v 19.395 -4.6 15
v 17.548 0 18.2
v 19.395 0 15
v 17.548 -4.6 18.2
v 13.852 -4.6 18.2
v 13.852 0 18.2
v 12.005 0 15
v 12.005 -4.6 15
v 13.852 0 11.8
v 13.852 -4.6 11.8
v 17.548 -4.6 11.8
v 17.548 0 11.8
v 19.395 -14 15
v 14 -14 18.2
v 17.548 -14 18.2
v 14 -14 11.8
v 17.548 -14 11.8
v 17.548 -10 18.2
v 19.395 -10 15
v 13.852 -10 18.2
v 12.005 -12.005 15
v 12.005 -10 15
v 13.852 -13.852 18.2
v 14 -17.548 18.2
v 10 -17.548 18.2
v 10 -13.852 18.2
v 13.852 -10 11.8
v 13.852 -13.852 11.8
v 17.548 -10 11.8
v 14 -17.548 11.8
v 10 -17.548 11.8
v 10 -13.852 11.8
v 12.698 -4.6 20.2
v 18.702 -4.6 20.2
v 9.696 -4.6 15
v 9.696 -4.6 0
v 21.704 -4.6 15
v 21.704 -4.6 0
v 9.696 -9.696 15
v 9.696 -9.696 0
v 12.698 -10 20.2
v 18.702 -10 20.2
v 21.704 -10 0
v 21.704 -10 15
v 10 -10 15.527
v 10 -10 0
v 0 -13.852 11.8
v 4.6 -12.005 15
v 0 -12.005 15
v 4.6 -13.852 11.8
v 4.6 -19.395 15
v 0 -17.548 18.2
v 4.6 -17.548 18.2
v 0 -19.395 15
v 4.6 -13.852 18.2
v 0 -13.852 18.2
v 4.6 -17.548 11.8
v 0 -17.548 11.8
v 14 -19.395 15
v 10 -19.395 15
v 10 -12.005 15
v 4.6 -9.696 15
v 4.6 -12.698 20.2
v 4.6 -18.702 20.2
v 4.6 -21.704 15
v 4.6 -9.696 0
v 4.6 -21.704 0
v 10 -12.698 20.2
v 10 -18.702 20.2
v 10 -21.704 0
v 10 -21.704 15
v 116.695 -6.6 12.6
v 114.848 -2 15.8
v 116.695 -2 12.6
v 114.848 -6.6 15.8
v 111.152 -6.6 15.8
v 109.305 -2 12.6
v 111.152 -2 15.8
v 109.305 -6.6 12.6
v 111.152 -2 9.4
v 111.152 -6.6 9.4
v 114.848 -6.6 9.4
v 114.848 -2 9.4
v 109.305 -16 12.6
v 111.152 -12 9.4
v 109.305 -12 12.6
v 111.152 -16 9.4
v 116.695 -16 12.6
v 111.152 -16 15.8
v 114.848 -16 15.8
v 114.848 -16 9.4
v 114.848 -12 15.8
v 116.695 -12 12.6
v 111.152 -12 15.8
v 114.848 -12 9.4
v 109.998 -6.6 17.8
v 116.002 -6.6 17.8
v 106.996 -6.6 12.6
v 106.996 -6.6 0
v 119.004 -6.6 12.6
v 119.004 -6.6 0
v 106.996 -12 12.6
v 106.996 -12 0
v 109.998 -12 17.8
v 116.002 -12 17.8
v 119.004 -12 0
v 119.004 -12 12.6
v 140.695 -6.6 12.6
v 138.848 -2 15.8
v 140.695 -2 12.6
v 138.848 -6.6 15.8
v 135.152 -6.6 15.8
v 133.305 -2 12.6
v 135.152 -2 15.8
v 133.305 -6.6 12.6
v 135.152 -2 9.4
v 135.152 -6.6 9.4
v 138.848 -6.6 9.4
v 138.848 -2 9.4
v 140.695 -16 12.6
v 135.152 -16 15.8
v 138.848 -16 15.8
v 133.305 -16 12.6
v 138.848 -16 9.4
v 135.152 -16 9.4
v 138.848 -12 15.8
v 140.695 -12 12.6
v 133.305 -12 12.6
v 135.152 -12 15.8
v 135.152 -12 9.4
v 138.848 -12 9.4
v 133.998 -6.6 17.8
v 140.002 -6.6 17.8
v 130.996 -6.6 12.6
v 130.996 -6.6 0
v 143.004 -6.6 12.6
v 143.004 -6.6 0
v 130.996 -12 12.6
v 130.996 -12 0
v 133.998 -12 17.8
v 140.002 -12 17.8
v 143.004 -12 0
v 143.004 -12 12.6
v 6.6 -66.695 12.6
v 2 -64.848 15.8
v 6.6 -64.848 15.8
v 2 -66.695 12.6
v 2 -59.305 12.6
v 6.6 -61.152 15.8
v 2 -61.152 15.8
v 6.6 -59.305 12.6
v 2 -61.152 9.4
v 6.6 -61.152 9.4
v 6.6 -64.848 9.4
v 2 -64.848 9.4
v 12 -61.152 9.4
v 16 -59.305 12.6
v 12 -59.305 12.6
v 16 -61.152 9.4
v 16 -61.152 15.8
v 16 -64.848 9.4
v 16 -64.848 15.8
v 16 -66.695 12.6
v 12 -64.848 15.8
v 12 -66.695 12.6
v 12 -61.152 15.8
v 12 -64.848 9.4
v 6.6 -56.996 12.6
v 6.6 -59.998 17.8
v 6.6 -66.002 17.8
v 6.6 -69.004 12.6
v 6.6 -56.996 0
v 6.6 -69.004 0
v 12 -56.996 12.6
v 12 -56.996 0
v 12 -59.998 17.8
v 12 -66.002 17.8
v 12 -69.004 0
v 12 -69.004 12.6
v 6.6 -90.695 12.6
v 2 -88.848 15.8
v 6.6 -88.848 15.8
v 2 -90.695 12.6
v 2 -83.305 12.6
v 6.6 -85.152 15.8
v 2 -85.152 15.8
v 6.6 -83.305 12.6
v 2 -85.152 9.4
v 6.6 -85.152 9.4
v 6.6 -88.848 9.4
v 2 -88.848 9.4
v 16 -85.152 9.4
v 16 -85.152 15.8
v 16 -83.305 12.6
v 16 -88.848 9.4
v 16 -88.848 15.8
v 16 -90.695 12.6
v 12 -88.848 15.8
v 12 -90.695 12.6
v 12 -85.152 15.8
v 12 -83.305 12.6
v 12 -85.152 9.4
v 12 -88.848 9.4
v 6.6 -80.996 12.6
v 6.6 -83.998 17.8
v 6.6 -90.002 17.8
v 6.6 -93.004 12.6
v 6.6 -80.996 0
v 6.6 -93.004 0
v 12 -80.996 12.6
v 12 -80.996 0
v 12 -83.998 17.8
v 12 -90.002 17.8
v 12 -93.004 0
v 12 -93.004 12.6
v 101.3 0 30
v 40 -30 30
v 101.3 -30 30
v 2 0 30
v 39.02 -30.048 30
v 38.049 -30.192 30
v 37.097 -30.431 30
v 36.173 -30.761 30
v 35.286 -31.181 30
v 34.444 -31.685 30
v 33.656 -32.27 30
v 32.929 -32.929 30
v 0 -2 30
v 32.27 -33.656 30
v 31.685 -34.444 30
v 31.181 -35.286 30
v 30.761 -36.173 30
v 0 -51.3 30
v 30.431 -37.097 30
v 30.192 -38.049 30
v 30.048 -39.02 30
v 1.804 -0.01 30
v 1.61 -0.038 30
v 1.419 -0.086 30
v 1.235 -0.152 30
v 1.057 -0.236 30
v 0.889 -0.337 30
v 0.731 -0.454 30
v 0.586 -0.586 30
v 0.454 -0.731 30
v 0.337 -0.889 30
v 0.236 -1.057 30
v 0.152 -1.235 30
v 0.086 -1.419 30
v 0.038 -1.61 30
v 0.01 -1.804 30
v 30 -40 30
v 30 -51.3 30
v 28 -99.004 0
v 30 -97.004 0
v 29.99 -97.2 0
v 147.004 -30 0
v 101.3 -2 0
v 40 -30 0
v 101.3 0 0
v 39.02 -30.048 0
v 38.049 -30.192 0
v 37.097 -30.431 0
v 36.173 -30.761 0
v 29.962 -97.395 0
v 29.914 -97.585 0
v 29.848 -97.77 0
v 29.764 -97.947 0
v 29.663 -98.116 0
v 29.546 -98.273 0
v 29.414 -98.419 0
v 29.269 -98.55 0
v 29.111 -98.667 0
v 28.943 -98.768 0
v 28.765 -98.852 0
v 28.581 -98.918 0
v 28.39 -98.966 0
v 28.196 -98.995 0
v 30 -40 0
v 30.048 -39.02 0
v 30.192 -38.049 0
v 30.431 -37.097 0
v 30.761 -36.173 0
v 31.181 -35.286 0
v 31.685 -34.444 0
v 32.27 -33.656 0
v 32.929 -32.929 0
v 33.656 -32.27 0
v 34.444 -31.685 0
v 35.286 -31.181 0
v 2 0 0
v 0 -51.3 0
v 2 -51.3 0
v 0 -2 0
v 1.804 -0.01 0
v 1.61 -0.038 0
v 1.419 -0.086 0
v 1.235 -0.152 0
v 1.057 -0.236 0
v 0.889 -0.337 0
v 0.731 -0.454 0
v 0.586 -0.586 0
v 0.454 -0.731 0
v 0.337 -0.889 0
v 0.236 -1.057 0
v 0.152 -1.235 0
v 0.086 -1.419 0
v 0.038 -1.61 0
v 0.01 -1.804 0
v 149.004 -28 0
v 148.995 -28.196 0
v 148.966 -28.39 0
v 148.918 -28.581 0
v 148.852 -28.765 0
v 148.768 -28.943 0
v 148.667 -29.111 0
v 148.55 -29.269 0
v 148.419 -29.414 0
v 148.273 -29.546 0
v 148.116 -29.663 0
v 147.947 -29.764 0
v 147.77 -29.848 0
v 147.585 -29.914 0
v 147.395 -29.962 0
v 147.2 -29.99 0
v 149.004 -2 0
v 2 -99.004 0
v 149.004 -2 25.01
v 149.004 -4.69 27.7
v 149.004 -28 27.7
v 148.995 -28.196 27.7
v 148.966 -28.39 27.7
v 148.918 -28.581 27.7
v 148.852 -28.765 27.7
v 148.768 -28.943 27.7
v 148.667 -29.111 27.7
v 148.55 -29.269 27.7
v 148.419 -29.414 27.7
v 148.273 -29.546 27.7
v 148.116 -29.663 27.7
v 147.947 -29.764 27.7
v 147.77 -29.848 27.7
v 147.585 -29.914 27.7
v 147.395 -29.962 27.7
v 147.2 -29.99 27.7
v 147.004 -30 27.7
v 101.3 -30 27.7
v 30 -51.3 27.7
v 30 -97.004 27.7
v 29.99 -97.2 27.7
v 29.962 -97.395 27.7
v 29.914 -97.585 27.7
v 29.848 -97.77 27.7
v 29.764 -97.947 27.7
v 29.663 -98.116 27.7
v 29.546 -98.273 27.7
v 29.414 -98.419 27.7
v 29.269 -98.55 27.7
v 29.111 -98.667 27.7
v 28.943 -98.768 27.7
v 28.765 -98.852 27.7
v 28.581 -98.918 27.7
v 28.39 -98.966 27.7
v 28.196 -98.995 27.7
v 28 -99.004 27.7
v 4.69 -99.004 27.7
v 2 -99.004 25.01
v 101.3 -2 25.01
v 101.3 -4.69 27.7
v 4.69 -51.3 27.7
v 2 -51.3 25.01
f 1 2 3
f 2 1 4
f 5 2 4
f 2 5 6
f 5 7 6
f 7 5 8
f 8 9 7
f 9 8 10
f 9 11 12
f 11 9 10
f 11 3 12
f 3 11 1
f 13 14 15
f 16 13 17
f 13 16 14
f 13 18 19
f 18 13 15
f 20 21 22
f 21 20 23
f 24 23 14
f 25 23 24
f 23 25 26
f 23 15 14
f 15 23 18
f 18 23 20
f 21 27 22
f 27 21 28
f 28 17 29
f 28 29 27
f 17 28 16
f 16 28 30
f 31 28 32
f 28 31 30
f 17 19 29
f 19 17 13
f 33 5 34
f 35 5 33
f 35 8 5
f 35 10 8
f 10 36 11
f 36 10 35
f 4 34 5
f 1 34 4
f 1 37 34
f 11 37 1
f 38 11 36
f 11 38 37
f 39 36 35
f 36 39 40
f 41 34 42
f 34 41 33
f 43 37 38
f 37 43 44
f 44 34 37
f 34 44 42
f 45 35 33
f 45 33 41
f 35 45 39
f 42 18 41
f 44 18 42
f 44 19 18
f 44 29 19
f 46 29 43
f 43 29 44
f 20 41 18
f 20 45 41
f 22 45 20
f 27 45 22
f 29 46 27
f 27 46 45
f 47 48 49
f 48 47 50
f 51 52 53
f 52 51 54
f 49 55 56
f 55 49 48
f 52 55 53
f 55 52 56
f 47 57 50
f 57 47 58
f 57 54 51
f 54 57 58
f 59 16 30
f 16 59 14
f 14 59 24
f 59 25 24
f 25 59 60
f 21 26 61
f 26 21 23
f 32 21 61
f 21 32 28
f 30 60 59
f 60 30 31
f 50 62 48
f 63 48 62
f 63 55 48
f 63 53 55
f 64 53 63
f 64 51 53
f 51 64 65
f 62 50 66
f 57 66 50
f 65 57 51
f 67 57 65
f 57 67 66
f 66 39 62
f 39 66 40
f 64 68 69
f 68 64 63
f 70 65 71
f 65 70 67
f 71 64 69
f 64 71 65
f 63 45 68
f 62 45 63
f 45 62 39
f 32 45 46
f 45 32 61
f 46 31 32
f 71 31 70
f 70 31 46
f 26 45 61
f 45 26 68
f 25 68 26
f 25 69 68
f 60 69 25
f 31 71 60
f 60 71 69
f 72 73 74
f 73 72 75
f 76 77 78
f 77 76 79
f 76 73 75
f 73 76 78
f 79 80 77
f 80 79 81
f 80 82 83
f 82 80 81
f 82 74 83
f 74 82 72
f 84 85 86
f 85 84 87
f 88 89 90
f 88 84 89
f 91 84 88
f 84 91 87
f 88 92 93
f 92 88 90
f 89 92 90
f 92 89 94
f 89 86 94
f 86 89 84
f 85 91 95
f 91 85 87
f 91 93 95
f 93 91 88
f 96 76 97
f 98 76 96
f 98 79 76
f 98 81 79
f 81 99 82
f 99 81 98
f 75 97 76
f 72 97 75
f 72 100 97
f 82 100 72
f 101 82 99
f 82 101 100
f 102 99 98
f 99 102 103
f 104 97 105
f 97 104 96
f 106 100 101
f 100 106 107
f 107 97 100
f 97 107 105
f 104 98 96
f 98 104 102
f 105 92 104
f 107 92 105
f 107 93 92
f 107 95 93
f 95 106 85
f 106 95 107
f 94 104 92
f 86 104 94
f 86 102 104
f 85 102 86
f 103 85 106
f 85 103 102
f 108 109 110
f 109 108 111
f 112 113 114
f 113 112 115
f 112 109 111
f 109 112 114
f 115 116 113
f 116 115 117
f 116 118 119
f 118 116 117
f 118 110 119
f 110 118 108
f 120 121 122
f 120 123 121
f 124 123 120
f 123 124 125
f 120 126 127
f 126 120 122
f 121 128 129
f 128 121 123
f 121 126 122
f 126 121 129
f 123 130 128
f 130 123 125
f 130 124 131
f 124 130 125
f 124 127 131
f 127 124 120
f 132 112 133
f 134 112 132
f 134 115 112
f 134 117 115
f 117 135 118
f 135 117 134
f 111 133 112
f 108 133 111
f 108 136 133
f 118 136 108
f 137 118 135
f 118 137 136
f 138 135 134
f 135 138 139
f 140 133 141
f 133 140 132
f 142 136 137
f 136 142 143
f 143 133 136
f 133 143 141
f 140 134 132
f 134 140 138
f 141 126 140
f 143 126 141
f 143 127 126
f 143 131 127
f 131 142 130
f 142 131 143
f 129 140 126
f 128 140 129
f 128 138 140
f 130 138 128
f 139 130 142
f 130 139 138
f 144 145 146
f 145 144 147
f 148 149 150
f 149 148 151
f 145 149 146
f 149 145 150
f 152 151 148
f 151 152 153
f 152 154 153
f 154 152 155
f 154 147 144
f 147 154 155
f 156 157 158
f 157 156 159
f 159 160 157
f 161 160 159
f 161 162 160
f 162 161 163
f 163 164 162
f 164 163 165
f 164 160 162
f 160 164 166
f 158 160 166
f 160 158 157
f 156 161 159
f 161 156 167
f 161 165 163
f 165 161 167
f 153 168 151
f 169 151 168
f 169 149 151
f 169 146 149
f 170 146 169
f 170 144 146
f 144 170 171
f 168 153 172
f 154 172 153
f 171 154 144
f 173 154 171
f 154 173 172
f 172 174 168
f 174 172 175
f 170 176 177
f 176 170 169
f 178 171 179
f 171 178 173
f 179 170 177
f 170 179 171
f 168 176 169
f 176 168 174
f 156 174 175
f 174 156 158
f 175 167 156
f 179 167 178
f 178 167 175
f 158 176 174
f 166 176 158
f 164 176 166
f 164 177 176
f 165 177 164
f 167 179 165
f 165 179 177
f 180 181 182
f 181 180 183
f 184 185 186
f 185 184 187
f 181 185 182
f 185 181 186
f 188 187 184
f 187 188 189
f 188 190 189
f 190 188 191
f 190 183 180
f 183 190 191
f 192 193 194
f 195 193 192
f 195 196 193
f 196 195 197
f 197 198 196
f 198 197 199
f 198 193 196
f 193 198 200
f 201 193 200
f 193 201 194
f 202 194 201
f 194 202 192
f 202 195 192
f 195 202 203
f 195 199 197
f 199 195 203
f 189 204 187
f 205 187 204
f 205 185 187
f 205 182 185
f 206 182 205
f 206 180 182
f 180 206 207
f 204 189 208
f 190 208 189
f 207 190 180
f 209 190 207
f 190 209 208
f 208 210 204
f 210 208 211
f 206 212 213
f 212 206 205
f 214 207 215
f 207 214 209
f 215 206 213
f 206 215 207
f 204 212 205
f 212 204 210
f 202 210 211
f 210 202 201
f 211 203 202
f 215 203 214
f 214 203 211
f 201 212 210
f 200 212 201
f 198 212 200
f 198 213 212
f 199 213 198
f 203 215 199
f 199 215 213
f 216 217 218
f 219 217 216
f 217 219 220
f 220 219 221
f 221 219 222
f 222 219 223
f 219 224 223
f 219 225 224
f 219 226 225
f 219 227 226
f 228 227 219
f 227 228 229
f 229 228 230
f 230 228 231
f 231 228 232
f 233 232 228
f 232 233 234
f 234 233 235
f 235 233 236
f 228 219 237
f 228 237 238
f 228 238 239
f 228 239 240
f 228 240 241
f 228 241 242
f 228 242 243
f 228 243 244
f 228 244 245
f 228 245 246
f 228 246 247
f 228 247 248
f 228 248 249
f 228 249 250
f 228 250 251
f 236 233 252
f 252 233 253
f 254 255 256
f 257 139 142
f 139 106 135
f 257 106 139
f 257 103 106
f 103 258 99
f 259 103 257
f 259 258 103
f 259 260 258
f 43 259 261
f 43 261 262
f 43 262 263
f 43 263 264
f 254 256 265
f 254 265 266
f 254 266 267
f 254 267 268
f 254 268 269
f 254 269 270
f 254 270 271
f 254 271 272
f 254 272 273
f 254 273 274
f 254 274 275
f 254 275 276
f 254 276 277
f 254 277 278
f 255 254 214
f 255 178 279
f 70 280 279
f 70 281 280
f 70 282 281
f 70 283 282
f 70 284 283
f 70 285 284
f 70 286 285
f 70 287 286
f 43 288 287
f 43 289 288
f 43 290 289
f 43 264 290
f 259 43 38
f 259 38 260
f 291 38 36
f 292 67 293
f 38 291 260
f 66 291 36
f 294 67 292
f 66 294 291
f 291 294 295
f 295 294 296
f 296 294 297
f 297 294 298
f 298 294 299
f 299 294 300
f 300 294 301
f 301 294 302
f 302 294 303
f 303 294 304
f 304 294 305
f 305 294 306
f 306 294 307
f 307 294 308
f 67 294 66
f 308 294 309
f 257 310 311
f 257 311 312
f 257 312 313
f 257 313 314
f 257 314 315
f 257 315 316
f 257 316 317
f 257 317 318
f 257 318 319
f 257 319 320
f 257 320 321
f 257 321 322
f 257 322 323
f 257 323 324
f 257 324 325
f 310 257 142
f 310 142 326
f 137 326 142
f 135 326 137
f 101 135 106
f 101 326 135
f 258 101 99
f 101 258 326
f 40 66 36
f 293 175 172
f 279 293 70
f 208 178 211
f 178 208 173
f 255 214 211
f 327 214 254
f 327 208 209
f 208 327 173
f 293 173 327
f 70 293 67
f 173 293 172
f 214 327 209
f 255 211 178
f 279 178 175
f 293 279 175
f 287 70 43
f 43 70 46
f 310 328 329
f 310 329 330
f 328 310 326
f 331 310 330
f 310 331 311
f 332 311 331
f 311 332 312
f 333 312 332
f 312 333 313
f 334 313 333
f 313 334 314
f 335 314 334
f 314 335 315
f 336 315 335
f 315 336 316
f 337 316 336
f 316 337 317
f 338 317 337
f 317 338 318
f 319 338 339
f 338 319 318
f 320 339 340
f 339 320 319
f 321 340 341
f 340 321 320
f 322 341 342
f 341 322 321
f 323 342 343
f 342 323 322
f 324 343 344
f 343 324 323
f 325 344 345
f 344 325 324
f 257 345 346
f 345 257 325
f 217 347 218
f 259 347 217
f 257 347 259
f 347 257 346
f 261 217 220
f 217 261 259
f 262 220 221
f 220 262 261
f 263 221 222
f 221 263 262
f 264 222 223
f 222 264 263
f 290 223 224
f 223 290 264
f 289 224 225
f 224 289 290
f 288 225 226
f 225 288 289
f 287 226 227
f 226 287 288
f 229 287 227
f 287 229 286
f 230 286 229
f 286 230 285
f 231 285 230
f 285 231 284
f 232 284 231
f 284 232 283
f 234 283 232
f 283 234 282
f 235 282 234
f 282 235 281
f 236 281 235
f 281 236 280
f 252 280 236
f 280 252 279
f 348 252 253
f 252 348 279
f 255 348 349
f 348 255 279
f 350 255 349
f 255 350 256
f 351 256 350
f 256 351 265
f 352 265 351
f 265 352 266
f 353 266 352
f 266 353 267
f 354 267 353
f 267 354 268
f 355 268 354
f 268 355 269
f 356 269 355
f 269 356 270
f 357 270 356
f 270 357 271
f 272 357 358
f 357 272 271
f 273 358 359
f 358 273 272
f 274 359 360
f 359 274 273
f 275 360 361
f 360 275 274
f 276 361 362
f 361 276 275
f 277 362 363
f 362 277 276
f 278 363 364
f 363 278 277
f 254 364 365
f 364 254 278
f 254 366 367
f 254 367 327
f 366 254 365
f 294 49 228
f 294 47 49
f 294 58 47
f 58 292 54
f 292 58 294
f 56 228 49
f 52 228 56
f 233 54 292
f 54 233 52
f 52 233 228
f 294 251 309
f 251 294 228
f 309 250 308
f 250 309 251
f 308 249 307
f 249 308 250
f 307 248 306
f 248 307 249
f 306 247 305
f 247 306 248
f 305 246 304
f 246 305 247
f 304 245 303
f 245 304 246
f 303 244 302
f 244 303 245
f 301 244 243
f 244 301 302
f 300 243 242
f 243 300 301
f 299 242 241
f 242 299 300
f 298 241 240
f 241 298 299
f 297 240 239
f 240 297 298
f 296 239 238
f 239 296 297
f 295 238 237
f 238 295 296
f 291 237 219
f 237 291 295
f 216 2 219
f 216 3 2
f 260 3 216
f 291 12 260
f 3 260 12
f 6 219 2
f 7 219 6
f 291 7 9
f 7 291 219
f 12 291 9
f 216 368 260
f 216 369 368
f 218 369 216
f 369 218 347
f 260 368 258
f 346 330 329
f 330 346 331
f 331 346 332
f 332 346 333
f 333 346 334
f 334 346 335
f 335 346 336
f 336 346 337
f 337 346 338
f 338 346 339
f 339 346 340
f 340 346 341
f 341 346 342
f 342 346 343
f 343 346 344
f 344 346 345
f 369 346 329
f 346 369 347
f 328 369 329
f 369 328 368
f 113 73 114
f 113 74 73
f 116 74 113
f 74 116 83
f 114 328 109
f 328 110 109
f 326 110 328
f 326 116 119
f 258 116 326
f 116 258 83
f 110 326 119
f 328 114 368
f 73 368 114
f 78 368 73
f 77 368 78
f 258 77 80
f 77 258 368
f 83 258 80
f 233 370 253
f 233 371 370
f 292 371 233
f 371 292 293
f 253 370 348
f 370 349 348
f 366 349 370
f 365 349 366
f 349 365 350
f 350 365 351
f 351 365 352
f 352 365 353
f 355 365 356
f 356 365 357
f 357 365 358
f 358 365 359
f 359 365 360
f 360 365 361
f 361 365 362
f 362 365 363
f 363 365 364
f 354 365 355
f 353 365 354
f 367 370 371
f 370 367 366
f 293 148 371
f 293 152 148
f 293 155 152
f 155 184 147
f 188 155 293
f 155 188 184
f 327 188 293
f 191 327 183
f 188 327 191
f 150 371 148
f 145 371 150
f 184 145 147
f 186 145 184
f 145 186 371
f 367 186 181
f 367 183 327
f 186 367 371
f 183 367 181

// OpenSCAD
// file: ../../../modules/steel_rack.scad
use <bolts.scad>;

bolt_edge_offset = 15;
bolt_positions = [
  bolt_edge_offset,
  bolt_edge_offset + 98,
  bolt_edge_offset + 98 + 24,
];

module bolt_and_nut(y, h) {
  nut_thickness = 5;
  translate([0, y, h / 2])
    m6_bolt_hole(h + 1, center = true);
  translate([0, y, h - nut_thickness / 2])
    rotate([0, 0, 90])
    m6_nut_trap(nut_thickness, center = true);
}

module long_bar(w, y, h) {
  difference() {
    translate([w / 2, y / 2, h / 2])
      cube([w, y, h], center = true);

    for (x = bolt_positions) {
      translate([x, 0, 0])
        bolt_and_nut(y / 2, h);
    }
  }
}

module short_bar(w, y, h) {
  difference() {
    translate([w / 2, y / 2, h / 2])
      cube([w, y, h], center = true);

    translate([bolt_positions[0], 0, 0])
      bolt_and_nut(y / 2, h);
  }
}

module fillet_profile(r, h) {
  linear_extrude(height = h, center = true)
    difference() {
      square([r, r]);
      circle(r = r, $fn = 64);
    }
}
// file: ../../../modules/slide_rail_outer_bracket.scad
use <bolts.scad>
use <steel_rack.scad>

// スライドレール外側とL字アングルを接合するL字ブラケット。
// 設計の経緯と確定値は ledger/designs/steel-rack-500x400.md が正本。
//
// 座標系 (部品自身の datum):
//   X = 0 がこの部品側のL字アングル外側面。部品はアングル板厚の内側から始まる
//   Y = 0 がスライドレール外側面。+Y がラック外側
//   Z = 0 が部品底面 (レール下端と一致)
// front は screw_x = [37, 101.5]、rear は [79.5, 176] を自分の datum
// から渡す。 M6 が高さ 22.5±12 の対称配置のため部品は Z 反転対称になり、
// 左右のレールにも上下反転するだけで同じ2部品を使い回せる。

bracket_height = 45;
flange_t = 10; // 短辺 (X方向厚) の厚さ
// 長辺 (Y方向厚) の厚さ。旧断面は flange_t=10 を共用していたが、レール面を
// rail_offset 分外へ出すと M6 ナット挿入口が長辺と重なるため 2mm 削った
// (10→8、user決定)。ナット六角の内縁 (y=8.000) と長辺外面がツライチになる
arm_t = 8;
// レール接触面のラック外側オフセット。組付け実測でレール間隔が 385mm しか
// なくケース 412mm が入らないため、(412 - 385) / 2 + 0.5 = 14mm ずつ
// 各レールを外側へ移す (user指示)。M6 実穴は既に開いており位置を変えられない
rail_offset = 14;
inner_r = 4;
m6_z = [ 10.5, 34.5 ];
// クリアランス基準: 呼び寸法 + 0.4mm (実プリントの嵌合結果から拡大)
m6_pass_flat = 6.4; // M6ボルト通し六角の二面幅 (手前5mm)
m6_nut_flat = 10.4; // M6ナット窪み六角の二面幅 (奥5mm、ナット実測9.8 + 実効0.6)
m6_stage_depth = 5;
screw_z = 22.5;
m4_pass_flat = 4.4; // M4小トラスネジ通し六角の二面幅
m4_nut_flat = 7.4; // M4ナット窪み六角の二面幅 (ナット実測6.8 + 実効0.6)
m4_nut_depth = 2.8; // M4ナット窪みの深さ (user指定)
edge_margin = 8; // 穴の外縁から部品端までの余白 (自由な辺のみ)
angle_t = 2.2; // L字アングルの板厚

// 六角プリズム: 軸X・上下の辺が水平 (flat-up)。
// 天井を短い水平ブリッジにして垂れの改善を狙う
// (point-up だと天井面が水平から30°になり垂れた — 嵌合試験で確認済み)
module
hex_x_flat_up(flat_d, l)
{
    rotate([ 0, 90, 0 ]) rotate([ 0, 0, 90 ]) hex_hole(flat_d = flat_d, h = l);
}

// 六角プリズム: 軸Y・上下の辺が水平 (flat-up)。M6と同じくブリッジ天井
module
hex_y_flat_up(flat_d, l)
{
    rotate([ 90, 0, 0 ]) hex_hole(flat_d = flat_d, h = l);
}

module
slide_rail_outer_bracket(screw_x, name = "bracket")
{
    // flat-up配置では水平方向の穴半径は対角/2 (= 二面幅/(2*cos30))。
    // 8mm余白の契約はこの実半径に対して守る
    m6_nut_diag = m6_nut_flat / cos(30);
    m4_nut_diag = m4_nut_flat / cos(30);
    // M6中心: 実物のアングルには旧断面 (長辺厚10) の導出値
    // (厚10 + 内側R + 余白 + M6六角対角/2 = 28.0044) で既に穴が開いている。
    // 旧導出式から rail_offset を引くことで M6 実穴と部品外端の絶対位置を
    // 保ったまま、レール接触面 (y=0) だけをラック外側へ 14mm 出す
    m6_y = flange_t + inner_r + edge_margin + m6_nut_diag / 2 - rail_offset;
    short_len = m6_y + m6_nut_diag / 2 + edge_margin;
    // 長辺のX終端: 最奥のM4穴の最大断面 (ナット窪みの対角の半分) + 余白
    arm_end = max(screw_x) + m4_nut_diag / 2 + edge_margin;

    echo(str("CONTRACT ", name, ": height = ", bracket_height));
    echo(str("CONTRACT ", name, ": flange_t = ", flange_t));
    echo(str("CONTRACT ", name, ": arm_t = ", arm_t));
    echo(str("CONTRACT ", name, ": rail_offset = ", rail_offset));
    echo(str("CONTRACT ", name, ": inner_r = ", inner_r));
    echo(str("CONTRACT ", name, ": m6_z = ", m6_z));
    echo(str("CONTRACT ", name, ": m6_pass_flat = ", m6_pass_flat));
    echo(str("CONTRACT ", name, ": m6_nut_flat = ", m6_nut_flat));
    echo(str("CONTRACT ", name, ": screw_z = ", screw_z));
    echo(str("CONTRACT ", name, ": m4_pass_flat = ", m4_pass_flat));
    echo(str("CONTRACT ", name, ": m4_nut_flat = ", m4_nut_flat));
    echo(str("CONTRACT ", name, ": m4_nut_depth = ", m4_nut_depth));
    echo(str("CONTRACT ", name, ": edge_margin = ", edge_margin));
    echo(str("CONTRACT ", name, ": angle_t = ", angle_t));
    echo(str("CONTRACT ", name, ": screw_x = ", screw_x));
    echo(str("CONTRACT ",
             name,
             ": m6_y = ",
             m6_y,
             ", short_len = ",
             short_len,
             ", arm_end = ",
             arm_end));

    // 余白の契約 (自由な辺のみ。高さ45とM6のZはuser固定値なので対象外)。
    // M6ナット六角の内縁 (m6_y - 対角/2 = 8.000) は長辺外面 (y = arm_t) と
    // ツライチで、ナット挿入口が長辺に塞がれない (1e-9 は浮動小数の丸め猶予)
    assert(m6_y - m6_nut_diag / 2 >= arm_t - 1e-9,
           "M6 nut slot is blocked by the arm");
    assert(short_len - (m6_y + m6_nut_diag / 2) >= edge_margin,
           "M6 hole too close to the short-flange edge");
    assert(arm_end - (max(screw_x) + m4_nut_diag / 2) >= edge_margin,
           "M4 hole too close to the arm end");
    assert(min(screw_x) - m4_nut_diag / 2 >= angle_t + flange_t,
           "M4 hole overlaps the short flange");

    difference()
    {
        union()
        {
            // 短辺: アングル内側に当たる縦板 (M6で締結)
            translate([ angle_t, 0, 0 ])
                cube([ flange_t, short_len, bracket_height ]);

            // 長辺: レール外側面に当たる横板 (M4小トラスネジ+ナットで締結)
            translate([ angle_t, 0, 0 ])
                cube([ arm_end - angle_t, arm_t, bracket_height ]);

            // 内側コーナーのR4フィレット (応力集中の回避)
            translate([
                angle_t + flange_t + inner_r,
                arm_t + inner_r,
                bracket_height / 2
            ]) rotate([ 0, 0, 180 ]) fillet_profile(inner_r, bracket_height);
        }

        // M6の2段六角穴 (軸X・flat-up): 手前5mmが通し、奥5mmがナット窪み。
        // ナット窪みは +X へ延長した挿入回廊 (x=7.2..17): 短辺の背面から
        // fillet の掛かる区間を局所カットし、fillet 外端 (x=16.2) を 0.8mm
        // 超えて開放することで M6 ナットを +X 側から真っ直ぐ挿入できる
        // (fillet と挿入経路の干渉分を削るのは user 許容)。
        // 六角の下頂点 (y=8.000) は長辺外面とツライチで、正確な接触は
        // 退化した稜 (非多様体STL) を作るため、hull で 0.2mm 下へ掃引して
        // 長辺外面に浅い逃げ溝を彫る (ナットの嵌合には影響しない)
        slot_start = angle_t + flange_t - m6_stage_depth;
        slot_end = angle_t + flange_t + inner_r + 0.8;
        slot_relief = 0.2;
        for (z = m6_z) {
            translate([ angle_t + m6_stage_depth / 2 - 0.05, m6_y, z ])
                hex_x_flat_up(m6_pass_flat, m6_stage_depth + 0.1);
            translate([ (slot_start + slot_end) / 2, m6_y, z ]) hull()
            {
                hex_x_flat_up(m6_nut_flat, slot_end - slot_start);
                translate([ 0, -slot_relief, 0 ])
                    hex_x_flat_up(m6_nut_flat, slot_end - slot_start);
            }
        }

        // M4小トラスネジの穴 (軸Y・flat-up):
        // 通しは全厚を貫通し、L字の内側面 (y=8) から深さ2.8mmのナット窪み。
        // ネジはレール内側から刺さり
        // (トラス頭はスライダーと干渉しない実測済み)、
        // ナットが窪みの底で受けてレール板とブラケットを共締めする
        for (x = screw_x) {
            translate([ x, arm_t / 2, screw_z ])
                hex_y_flat_up(m4_pass_flat, arm_t + 0.2);
            translate([ x, arm_t - m4_nut_depth / 2 + 0.05, screw_z ])
                hex_y_flat_up(m4_nut_flat, m4_nut_depth + 0.1);
        }
    }
}
// file: ../../../modules/bolts.scad
module nut_trap(d, h, center = true) {
  linear_extrude(height = h, center = center)
  circle(d = d / cos(30), $fn = 6);
}

module bolt_hole(d, h, center = true) {
  linear_extrude(height = h, center = center)
  circle(d = d, $fn = 64);
}

// Hex holes for self-tapping (nominal - 0.2mm)
module hex_hole(flat_d, h) {
  linear_extrude(height = h, center = true)
  circle(d = flat_d / cos(30), $fn = 6);
}

module m3_bolt_hexhole(h) {
  rotate([0, 0, 90]) hex_hole(flat_d = 2.8, h = h);
}

module m4_bolt_hexhole(h) {
  rotate([0, 0, 90]) hex_hole(flat_d = 3.8, h = h);
}

module m6_bolt_hexhole(h) {
  rotate([0, 0, 90]) hex_hole(flat_d = 5.8, h = h);
}

module m8_bolt_hexhole(h) {
  rotate([0, 0, 90]) hex_hole(flat_d = 7.8, h = h);
}

// M3
module m3_bolt_hole(h, center = false) { bolt_hole(d = 3.4, h = h, center = center); }
module m3_nut_trap(h, center = false) { nut_trap(d = 5.7, h = h, center = center); }

// M4
module m4_bolt_hole(h, center = false) { bolt_hole(d = 4.4, h = h, center = center); }
module m4_nut_trap(h, center = false) { nut_trap(d = 7.5, h = h, center = center); }

// M6
module m6_bolt_hole(h, center = false) { bolt_hole(d = 6.2, h = h, center = center); }
module m6_nut_trap(h, center = false) { nut_trap(d = 10.2, h = h, center = center); }

// M8
module m8_bolt_hole(h, center = false) { bolt_hole(d = 8.4, h = h, center = center); }
module m8_nut_trap(h, center = false) { nut_trap(d = 13.3, h = h, center = center); }
// main file
use <../../../modules/shelf_frame.scad>

// ケース棚の枠の角。手前左・奥右用。印刷は上面をビルドプレートへ置いた向き。
shelf_frame_corner_print();
